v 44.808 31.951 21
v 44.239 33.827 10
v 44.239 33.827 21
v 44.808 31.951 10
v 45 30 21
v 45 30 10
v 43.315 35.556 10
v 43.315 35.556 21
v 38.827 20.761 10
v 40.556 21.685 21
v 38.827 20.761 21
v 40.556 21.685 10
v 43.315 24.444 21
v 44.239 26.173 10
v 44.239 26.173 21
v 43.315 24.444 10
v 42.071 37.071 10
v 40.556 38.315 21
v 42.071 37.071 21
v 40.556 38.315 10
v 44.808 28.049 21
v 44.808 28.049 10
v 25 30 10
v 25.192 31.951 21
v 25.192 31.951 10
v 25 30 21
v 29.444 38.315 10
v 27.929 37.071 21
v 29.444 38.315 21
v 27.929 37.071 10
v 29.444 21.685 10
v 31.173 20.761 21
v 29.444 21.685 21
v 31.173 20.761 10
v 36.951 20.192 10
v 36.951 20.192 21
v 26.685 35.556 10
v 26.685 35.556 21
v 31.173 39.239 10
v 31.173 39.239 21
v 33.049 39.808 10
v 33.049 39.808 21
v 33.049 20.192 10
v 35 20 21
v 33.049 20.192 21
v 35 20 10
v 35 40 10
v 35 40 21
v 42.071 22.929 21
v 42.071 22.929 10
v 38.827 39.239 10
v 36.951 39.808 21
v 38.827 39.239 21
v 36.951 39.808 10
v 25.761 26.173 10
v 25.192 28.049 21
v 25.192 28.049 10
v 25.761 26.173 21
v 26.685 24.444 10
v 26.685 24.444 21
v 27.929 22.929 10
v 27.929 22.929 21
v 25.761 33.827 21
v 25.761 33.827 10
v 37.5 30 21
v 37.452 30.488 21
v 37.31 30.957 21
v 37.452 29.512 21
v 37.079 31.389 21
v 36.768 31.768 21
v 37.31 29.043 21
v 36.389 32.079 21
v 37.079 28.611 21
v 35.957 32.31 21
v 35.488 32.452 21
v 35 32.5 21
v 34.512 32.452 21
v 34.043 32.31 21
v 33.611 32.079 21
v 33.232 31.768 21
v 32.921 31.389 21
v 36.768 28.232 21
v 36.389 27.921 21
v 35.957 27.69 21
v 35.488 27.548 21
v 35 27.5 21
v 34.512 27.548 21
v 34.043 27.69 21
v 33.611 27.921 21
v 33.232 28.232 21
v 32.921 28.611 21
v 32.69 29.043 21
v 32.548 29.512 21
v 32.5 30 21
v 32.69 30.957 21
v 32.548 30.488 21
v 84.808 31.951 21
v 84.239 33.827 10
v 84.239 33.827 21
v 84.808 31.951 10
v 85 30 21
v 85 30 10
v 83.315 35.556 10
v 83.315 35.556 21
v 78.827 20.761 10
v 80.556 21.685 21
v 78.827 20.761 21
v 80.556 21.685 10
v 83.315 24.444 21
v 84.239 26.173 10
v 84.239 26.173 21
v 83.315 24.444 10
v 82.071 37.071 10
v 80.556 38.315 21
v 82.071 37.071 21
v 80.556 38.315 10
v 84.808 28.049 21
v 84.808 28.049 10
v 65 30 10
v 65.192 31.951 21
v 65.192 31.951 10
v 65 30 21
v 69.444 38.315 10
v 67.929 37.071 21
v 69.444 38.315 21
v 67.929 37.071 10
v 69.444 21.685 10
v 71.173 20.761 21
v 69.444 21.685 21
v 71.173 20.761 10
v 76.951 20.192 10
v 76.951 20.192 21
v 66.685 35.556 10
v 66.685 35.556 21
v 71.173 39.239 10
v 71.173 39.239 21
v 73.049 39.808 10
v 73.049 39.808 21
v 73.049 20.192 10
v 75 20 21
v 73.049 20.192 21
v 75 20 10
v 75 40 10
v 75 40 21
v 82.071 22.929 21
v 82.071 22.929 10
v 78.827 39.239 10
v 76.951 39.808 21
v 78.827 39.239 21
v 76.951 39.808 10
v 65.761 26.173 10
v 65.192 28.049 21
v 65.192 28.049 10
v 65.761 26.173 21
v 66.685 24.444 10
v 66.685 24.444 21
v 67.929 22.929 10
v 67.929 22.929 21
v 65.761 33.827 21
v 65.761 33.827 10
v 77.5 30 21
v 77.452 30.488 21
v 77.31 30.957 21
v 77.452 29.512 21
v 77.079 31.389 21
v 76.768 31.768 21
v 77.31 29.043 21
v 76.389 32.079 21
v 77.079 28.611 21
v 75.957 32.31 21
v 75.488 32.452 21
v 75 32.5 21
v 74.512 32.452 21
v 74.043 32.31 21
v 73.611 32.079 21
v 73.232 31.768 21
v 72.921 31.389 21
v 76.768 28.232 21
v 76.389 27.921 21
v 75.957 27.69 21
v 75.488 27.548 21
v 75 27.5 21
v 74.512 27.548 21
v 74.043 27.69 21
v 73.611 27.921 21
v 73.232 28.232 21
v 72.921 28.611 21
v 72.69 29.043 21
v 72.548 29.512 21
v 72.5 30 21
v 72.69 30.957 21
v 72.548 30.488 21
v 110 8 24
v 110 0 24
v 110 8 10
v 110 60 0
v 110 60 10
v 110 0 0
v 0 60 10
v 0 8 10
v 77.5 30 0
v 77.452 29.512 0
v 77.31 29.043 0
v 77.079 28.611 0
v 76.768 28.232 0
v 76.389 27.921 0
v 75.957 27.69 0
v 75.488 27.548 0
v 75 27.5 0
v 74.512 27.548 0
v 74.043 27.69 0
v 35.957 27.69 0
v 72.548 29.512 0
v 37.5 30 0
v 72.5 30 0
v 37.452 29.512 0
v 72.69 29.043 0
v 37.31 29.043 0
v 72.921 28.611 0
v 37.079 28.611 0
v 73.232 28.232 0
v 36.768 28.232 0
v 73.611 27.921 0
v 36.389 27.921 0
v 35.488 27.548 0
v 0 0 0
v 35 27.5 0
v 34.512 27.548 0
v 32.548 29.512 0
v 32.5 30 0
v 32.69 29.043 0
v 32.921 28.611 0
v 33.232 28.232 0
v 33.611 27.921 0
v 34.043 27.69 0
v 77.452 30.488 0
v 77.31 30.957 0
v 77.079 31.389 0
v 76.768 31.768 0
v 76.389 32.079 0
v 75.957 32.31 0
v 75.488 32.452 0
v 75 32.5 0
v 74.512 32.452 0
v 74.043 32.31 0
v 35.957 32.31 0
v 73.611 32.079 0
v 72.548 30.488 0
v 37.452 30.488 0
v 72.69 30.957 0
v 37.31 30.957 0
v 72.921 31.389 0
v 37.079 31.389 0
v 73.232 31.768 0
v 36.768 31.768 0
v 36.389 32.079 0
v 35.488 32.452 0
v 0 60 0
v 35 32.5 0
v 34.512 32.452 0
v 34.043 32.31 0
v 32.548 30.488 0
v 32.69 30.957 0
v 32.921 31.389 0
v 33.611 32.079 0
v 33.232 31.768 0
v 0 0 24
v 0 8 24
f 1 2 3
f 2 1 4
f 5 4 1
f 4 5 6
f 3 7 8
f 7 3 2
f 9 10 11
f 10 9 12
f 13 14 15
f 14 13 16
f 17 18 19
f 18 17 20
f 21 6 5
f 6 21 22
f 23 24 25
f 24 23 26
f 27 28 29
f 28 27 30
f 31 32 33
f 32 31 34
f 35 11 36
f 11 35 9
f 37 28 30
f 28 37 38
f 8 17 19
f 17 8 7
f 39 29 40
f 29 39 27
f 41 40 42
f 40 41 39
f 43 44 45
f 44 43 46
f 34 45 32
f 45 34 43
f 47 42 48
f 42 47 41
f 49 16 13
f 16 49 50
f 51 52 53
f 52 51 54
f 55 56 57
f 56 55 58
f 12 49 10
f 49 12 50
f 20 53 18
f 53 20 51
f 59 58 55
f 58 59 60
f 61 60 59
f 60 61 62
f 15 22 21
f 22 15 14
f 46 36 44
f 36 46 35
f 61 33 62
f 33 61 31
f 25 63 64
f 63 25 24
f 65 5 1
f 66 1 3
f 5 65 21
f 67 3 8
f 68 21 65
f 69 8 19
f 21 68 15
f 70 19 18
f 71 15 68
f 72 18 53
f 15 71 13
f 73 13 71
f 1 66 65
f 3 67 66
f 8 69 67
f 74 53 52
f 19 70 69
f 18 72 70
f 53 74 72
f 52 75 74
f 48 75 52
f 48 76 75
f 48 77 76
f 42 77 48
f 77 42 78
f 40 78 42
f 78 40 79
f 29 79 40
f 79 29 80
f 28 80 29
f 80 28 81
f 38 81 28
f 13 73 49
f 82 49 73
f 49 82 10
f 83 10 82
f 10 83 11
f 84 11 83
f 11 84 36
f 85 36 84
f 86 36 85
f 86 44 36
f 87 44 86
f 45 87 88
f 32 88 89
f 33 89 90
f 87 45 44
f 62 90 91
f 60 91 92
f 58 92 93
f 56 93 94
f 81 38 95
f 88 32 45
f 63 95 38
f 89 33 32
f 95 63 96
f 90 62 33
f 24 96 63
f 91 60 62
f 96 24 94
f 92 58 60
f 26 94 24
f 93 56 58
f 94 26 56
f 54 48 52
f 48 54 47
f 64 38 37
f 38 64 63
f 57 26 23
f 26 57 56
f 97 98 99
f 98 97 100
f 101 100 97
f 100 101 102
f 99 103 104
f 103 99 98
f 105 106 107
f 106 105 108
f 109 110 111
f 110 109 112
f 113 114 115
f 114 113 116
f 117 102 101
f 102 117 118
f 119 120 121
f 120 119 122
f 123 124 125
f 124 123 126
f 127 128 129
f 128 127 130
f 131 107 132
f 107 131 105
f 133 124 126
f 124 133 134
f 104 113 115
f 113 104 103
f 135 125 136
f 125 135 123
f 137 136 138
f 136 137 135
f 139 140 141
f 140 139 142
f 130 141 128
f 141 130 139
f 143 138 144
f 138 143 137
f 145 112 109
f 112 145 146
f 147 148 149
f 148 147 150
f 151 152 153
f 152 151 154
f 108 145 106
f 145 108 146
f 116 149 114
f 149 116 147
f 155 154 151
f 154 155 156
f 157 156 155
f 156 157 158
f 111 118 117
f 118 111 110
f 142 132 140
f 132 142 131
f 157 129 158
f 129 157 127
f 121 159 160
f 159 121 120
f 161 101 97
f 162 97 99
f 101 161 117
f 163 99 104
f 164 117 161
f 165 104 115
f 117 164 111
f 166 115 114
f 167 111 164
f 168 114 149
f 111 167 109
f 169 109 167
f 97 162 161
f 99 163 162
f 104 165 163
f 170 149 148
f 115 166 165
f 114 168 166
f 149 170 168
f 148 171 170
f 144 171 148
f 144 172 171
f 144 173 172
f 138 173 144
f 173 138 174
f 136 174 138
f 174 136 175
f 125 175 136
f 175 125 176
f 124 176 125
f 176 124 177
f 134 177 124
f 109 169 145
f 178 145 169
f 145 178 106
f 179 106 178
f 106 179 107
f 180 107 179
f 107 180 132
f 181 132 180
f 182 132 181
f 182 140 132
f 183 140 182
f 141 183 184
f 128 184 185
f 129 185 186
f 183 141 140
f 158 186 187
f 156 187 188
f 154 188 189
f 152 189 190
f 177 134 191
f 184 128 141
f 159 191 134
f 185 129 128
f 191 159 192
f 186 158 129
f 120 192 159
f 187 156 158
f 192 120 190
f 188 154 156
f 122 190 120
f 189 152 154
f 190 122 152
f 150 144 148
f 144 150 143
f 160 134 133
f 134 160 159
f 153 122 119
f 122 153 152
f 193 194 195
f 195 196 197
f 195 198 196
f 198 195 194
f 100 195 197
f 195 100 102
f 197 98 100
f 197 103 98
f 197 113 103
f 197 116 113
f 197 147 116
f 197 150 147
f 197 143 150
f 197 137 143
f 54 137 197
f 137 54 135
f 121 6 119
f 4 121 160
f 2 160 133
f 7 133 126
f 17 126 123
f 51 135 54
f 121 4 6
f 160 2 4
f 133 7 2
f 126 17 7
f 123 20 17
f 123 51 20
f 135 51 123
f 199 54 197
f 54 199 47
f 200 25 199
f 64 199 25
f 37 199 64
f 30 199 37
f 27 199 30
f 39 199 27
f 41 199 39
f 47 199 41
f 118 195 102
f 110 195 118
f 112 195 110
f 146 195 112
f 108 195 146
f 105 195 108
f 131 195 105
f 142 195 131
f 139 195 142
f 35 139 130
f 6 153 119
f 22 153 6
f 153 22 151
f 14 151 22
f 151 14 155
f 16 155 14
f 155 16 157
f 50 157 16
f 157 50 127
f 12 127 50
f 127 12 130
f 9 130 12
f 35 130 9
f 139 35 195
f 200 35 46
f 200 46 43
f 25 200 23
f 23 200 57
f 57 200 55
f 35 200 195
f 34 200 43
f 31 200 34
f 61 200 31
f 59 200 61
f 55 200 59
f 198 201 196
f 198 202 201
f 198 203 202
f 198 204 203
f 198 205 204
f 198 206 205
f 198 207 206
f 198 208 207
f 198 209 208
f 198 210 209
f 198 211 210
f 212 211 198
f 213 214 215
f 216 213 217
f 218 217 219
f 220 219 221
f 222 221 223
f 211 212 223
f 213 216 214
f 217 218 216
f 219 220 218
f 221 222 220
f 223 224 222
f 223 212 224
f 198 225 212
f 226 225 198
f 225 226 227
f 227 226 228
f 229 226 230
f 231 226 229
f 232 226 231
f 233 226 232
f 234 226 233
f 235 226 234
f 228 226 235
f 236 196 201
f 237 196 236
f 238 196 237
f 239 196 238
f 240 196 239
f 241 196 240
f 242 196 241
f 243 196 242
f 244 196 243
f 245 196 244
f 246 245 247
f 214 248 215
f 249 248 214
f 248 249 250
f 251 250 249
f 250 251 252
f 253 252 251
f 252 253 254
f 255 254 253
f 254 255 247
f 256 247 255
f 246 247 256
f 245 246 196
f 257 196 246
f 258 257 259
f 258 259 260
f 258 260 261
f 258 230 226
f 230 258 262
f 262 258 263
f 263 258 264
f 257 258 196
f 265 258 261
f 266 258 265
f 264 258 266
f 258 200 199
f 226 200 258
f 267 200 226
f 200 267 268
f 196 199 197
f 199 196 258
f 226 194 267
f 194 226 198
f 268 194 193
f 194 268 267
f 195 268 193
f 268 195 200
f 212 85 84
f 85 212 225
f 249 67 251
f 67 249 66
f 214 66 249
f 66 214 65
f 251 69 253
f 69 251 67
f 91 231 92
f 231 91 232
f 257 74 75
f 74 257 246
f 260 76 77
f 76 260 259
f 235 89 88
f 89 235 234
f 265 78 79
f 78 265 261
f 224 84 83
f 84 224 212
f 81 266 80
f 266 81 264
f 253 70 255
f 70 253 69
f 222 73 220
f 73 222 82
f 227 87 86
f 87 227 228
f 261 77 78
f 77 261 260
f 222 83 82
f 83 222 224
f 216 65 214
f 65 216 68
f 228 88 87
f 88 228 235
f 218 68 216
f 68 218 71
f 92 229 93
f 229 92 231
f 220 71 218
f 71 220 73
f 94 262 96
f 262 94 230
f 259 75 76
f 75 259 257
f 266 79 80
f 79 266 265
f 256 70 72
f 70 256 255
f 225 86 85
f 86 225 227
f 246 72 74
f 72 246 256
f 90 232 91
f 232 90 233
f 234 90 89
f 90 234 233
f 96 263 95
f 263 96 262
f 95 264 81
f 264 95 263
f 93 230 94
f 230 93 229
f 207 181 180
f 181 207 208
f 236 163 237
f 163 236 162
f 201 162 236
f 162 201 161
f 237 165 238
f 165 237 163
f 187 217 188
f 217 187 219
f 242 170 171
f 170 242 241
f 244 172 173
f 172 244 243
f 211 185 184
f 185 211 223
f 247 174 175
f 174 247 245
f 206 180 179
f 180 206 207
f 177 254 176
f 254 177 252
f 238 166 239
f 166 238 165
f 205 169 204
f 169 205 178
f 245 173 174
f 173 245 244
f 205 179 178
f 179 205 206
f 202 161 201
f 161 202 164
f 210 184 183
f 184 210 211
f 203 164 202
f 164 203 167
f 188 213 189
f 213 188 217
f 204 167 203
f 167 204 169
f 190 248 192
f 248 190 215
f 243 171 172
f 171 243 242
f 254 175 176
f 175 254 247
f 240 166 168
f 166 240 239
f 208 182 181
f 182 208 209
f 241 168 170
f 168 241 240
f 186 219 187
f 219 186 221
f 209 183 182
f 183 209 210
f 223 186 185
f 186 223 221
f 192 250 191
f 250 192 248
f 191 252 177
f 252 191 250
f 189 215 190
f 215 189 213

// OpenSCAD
$fn = 32;

// ----------------------------------------------------------------------
// Drill jig: fence jig
// ----------------------------------------------------------------------

// --- parameters (mm) ---
plate_l = 110;            // plate length, X
plate_w = 60;             // plate width, Y
plate_t = 10;             // plate thickness
boss_d = 20;              // guide boss diameter
boss_h = 12;              // boss height above the plate
guide_d = 5;              // guide hole diameter
boss_pitch = 40;          // boss pitch
fence_h = 15;             // fence height above the plate
fence_t = 8;              // fence thickness
fit_tol = 0.02;           // tolerance for press fits, mm
free_tol = 0.2;           // tolerance for clearance fits, mm

n_boss = 2;  // guide bosses
boss_x0 = (plate_l - (n_boss - 1) * boss_pitch) / 2;  // first boss X
boss_top = plate_t - 1 + boss_h;  // boss crown height
fence_top = plate_t - 1 + fence_h;  // fence crown height
total_h = max([fence_top, boss_top]);  // overall height

difference() {
  union() {
  cube([plate_l, plate_w, plate_t]);
  for (i = [0 : n_boss - 1])
    translate([boss_x0 + i * boss_pitch, plate_w / 2, plate_t - 1])
      cylinder(h = boss_h, d = boss_d);
  translate([0, 0, plate_t - 1]) cube([plate_l, fence_t, fence_h]);
  }
  for (i = [0 : n_boss - 1])
    translate([boss_x0 + i * boss_pitch, plate_w / 2, -1])
      cylinder(h = plate_t + boss_h, d = guide_d);
}
